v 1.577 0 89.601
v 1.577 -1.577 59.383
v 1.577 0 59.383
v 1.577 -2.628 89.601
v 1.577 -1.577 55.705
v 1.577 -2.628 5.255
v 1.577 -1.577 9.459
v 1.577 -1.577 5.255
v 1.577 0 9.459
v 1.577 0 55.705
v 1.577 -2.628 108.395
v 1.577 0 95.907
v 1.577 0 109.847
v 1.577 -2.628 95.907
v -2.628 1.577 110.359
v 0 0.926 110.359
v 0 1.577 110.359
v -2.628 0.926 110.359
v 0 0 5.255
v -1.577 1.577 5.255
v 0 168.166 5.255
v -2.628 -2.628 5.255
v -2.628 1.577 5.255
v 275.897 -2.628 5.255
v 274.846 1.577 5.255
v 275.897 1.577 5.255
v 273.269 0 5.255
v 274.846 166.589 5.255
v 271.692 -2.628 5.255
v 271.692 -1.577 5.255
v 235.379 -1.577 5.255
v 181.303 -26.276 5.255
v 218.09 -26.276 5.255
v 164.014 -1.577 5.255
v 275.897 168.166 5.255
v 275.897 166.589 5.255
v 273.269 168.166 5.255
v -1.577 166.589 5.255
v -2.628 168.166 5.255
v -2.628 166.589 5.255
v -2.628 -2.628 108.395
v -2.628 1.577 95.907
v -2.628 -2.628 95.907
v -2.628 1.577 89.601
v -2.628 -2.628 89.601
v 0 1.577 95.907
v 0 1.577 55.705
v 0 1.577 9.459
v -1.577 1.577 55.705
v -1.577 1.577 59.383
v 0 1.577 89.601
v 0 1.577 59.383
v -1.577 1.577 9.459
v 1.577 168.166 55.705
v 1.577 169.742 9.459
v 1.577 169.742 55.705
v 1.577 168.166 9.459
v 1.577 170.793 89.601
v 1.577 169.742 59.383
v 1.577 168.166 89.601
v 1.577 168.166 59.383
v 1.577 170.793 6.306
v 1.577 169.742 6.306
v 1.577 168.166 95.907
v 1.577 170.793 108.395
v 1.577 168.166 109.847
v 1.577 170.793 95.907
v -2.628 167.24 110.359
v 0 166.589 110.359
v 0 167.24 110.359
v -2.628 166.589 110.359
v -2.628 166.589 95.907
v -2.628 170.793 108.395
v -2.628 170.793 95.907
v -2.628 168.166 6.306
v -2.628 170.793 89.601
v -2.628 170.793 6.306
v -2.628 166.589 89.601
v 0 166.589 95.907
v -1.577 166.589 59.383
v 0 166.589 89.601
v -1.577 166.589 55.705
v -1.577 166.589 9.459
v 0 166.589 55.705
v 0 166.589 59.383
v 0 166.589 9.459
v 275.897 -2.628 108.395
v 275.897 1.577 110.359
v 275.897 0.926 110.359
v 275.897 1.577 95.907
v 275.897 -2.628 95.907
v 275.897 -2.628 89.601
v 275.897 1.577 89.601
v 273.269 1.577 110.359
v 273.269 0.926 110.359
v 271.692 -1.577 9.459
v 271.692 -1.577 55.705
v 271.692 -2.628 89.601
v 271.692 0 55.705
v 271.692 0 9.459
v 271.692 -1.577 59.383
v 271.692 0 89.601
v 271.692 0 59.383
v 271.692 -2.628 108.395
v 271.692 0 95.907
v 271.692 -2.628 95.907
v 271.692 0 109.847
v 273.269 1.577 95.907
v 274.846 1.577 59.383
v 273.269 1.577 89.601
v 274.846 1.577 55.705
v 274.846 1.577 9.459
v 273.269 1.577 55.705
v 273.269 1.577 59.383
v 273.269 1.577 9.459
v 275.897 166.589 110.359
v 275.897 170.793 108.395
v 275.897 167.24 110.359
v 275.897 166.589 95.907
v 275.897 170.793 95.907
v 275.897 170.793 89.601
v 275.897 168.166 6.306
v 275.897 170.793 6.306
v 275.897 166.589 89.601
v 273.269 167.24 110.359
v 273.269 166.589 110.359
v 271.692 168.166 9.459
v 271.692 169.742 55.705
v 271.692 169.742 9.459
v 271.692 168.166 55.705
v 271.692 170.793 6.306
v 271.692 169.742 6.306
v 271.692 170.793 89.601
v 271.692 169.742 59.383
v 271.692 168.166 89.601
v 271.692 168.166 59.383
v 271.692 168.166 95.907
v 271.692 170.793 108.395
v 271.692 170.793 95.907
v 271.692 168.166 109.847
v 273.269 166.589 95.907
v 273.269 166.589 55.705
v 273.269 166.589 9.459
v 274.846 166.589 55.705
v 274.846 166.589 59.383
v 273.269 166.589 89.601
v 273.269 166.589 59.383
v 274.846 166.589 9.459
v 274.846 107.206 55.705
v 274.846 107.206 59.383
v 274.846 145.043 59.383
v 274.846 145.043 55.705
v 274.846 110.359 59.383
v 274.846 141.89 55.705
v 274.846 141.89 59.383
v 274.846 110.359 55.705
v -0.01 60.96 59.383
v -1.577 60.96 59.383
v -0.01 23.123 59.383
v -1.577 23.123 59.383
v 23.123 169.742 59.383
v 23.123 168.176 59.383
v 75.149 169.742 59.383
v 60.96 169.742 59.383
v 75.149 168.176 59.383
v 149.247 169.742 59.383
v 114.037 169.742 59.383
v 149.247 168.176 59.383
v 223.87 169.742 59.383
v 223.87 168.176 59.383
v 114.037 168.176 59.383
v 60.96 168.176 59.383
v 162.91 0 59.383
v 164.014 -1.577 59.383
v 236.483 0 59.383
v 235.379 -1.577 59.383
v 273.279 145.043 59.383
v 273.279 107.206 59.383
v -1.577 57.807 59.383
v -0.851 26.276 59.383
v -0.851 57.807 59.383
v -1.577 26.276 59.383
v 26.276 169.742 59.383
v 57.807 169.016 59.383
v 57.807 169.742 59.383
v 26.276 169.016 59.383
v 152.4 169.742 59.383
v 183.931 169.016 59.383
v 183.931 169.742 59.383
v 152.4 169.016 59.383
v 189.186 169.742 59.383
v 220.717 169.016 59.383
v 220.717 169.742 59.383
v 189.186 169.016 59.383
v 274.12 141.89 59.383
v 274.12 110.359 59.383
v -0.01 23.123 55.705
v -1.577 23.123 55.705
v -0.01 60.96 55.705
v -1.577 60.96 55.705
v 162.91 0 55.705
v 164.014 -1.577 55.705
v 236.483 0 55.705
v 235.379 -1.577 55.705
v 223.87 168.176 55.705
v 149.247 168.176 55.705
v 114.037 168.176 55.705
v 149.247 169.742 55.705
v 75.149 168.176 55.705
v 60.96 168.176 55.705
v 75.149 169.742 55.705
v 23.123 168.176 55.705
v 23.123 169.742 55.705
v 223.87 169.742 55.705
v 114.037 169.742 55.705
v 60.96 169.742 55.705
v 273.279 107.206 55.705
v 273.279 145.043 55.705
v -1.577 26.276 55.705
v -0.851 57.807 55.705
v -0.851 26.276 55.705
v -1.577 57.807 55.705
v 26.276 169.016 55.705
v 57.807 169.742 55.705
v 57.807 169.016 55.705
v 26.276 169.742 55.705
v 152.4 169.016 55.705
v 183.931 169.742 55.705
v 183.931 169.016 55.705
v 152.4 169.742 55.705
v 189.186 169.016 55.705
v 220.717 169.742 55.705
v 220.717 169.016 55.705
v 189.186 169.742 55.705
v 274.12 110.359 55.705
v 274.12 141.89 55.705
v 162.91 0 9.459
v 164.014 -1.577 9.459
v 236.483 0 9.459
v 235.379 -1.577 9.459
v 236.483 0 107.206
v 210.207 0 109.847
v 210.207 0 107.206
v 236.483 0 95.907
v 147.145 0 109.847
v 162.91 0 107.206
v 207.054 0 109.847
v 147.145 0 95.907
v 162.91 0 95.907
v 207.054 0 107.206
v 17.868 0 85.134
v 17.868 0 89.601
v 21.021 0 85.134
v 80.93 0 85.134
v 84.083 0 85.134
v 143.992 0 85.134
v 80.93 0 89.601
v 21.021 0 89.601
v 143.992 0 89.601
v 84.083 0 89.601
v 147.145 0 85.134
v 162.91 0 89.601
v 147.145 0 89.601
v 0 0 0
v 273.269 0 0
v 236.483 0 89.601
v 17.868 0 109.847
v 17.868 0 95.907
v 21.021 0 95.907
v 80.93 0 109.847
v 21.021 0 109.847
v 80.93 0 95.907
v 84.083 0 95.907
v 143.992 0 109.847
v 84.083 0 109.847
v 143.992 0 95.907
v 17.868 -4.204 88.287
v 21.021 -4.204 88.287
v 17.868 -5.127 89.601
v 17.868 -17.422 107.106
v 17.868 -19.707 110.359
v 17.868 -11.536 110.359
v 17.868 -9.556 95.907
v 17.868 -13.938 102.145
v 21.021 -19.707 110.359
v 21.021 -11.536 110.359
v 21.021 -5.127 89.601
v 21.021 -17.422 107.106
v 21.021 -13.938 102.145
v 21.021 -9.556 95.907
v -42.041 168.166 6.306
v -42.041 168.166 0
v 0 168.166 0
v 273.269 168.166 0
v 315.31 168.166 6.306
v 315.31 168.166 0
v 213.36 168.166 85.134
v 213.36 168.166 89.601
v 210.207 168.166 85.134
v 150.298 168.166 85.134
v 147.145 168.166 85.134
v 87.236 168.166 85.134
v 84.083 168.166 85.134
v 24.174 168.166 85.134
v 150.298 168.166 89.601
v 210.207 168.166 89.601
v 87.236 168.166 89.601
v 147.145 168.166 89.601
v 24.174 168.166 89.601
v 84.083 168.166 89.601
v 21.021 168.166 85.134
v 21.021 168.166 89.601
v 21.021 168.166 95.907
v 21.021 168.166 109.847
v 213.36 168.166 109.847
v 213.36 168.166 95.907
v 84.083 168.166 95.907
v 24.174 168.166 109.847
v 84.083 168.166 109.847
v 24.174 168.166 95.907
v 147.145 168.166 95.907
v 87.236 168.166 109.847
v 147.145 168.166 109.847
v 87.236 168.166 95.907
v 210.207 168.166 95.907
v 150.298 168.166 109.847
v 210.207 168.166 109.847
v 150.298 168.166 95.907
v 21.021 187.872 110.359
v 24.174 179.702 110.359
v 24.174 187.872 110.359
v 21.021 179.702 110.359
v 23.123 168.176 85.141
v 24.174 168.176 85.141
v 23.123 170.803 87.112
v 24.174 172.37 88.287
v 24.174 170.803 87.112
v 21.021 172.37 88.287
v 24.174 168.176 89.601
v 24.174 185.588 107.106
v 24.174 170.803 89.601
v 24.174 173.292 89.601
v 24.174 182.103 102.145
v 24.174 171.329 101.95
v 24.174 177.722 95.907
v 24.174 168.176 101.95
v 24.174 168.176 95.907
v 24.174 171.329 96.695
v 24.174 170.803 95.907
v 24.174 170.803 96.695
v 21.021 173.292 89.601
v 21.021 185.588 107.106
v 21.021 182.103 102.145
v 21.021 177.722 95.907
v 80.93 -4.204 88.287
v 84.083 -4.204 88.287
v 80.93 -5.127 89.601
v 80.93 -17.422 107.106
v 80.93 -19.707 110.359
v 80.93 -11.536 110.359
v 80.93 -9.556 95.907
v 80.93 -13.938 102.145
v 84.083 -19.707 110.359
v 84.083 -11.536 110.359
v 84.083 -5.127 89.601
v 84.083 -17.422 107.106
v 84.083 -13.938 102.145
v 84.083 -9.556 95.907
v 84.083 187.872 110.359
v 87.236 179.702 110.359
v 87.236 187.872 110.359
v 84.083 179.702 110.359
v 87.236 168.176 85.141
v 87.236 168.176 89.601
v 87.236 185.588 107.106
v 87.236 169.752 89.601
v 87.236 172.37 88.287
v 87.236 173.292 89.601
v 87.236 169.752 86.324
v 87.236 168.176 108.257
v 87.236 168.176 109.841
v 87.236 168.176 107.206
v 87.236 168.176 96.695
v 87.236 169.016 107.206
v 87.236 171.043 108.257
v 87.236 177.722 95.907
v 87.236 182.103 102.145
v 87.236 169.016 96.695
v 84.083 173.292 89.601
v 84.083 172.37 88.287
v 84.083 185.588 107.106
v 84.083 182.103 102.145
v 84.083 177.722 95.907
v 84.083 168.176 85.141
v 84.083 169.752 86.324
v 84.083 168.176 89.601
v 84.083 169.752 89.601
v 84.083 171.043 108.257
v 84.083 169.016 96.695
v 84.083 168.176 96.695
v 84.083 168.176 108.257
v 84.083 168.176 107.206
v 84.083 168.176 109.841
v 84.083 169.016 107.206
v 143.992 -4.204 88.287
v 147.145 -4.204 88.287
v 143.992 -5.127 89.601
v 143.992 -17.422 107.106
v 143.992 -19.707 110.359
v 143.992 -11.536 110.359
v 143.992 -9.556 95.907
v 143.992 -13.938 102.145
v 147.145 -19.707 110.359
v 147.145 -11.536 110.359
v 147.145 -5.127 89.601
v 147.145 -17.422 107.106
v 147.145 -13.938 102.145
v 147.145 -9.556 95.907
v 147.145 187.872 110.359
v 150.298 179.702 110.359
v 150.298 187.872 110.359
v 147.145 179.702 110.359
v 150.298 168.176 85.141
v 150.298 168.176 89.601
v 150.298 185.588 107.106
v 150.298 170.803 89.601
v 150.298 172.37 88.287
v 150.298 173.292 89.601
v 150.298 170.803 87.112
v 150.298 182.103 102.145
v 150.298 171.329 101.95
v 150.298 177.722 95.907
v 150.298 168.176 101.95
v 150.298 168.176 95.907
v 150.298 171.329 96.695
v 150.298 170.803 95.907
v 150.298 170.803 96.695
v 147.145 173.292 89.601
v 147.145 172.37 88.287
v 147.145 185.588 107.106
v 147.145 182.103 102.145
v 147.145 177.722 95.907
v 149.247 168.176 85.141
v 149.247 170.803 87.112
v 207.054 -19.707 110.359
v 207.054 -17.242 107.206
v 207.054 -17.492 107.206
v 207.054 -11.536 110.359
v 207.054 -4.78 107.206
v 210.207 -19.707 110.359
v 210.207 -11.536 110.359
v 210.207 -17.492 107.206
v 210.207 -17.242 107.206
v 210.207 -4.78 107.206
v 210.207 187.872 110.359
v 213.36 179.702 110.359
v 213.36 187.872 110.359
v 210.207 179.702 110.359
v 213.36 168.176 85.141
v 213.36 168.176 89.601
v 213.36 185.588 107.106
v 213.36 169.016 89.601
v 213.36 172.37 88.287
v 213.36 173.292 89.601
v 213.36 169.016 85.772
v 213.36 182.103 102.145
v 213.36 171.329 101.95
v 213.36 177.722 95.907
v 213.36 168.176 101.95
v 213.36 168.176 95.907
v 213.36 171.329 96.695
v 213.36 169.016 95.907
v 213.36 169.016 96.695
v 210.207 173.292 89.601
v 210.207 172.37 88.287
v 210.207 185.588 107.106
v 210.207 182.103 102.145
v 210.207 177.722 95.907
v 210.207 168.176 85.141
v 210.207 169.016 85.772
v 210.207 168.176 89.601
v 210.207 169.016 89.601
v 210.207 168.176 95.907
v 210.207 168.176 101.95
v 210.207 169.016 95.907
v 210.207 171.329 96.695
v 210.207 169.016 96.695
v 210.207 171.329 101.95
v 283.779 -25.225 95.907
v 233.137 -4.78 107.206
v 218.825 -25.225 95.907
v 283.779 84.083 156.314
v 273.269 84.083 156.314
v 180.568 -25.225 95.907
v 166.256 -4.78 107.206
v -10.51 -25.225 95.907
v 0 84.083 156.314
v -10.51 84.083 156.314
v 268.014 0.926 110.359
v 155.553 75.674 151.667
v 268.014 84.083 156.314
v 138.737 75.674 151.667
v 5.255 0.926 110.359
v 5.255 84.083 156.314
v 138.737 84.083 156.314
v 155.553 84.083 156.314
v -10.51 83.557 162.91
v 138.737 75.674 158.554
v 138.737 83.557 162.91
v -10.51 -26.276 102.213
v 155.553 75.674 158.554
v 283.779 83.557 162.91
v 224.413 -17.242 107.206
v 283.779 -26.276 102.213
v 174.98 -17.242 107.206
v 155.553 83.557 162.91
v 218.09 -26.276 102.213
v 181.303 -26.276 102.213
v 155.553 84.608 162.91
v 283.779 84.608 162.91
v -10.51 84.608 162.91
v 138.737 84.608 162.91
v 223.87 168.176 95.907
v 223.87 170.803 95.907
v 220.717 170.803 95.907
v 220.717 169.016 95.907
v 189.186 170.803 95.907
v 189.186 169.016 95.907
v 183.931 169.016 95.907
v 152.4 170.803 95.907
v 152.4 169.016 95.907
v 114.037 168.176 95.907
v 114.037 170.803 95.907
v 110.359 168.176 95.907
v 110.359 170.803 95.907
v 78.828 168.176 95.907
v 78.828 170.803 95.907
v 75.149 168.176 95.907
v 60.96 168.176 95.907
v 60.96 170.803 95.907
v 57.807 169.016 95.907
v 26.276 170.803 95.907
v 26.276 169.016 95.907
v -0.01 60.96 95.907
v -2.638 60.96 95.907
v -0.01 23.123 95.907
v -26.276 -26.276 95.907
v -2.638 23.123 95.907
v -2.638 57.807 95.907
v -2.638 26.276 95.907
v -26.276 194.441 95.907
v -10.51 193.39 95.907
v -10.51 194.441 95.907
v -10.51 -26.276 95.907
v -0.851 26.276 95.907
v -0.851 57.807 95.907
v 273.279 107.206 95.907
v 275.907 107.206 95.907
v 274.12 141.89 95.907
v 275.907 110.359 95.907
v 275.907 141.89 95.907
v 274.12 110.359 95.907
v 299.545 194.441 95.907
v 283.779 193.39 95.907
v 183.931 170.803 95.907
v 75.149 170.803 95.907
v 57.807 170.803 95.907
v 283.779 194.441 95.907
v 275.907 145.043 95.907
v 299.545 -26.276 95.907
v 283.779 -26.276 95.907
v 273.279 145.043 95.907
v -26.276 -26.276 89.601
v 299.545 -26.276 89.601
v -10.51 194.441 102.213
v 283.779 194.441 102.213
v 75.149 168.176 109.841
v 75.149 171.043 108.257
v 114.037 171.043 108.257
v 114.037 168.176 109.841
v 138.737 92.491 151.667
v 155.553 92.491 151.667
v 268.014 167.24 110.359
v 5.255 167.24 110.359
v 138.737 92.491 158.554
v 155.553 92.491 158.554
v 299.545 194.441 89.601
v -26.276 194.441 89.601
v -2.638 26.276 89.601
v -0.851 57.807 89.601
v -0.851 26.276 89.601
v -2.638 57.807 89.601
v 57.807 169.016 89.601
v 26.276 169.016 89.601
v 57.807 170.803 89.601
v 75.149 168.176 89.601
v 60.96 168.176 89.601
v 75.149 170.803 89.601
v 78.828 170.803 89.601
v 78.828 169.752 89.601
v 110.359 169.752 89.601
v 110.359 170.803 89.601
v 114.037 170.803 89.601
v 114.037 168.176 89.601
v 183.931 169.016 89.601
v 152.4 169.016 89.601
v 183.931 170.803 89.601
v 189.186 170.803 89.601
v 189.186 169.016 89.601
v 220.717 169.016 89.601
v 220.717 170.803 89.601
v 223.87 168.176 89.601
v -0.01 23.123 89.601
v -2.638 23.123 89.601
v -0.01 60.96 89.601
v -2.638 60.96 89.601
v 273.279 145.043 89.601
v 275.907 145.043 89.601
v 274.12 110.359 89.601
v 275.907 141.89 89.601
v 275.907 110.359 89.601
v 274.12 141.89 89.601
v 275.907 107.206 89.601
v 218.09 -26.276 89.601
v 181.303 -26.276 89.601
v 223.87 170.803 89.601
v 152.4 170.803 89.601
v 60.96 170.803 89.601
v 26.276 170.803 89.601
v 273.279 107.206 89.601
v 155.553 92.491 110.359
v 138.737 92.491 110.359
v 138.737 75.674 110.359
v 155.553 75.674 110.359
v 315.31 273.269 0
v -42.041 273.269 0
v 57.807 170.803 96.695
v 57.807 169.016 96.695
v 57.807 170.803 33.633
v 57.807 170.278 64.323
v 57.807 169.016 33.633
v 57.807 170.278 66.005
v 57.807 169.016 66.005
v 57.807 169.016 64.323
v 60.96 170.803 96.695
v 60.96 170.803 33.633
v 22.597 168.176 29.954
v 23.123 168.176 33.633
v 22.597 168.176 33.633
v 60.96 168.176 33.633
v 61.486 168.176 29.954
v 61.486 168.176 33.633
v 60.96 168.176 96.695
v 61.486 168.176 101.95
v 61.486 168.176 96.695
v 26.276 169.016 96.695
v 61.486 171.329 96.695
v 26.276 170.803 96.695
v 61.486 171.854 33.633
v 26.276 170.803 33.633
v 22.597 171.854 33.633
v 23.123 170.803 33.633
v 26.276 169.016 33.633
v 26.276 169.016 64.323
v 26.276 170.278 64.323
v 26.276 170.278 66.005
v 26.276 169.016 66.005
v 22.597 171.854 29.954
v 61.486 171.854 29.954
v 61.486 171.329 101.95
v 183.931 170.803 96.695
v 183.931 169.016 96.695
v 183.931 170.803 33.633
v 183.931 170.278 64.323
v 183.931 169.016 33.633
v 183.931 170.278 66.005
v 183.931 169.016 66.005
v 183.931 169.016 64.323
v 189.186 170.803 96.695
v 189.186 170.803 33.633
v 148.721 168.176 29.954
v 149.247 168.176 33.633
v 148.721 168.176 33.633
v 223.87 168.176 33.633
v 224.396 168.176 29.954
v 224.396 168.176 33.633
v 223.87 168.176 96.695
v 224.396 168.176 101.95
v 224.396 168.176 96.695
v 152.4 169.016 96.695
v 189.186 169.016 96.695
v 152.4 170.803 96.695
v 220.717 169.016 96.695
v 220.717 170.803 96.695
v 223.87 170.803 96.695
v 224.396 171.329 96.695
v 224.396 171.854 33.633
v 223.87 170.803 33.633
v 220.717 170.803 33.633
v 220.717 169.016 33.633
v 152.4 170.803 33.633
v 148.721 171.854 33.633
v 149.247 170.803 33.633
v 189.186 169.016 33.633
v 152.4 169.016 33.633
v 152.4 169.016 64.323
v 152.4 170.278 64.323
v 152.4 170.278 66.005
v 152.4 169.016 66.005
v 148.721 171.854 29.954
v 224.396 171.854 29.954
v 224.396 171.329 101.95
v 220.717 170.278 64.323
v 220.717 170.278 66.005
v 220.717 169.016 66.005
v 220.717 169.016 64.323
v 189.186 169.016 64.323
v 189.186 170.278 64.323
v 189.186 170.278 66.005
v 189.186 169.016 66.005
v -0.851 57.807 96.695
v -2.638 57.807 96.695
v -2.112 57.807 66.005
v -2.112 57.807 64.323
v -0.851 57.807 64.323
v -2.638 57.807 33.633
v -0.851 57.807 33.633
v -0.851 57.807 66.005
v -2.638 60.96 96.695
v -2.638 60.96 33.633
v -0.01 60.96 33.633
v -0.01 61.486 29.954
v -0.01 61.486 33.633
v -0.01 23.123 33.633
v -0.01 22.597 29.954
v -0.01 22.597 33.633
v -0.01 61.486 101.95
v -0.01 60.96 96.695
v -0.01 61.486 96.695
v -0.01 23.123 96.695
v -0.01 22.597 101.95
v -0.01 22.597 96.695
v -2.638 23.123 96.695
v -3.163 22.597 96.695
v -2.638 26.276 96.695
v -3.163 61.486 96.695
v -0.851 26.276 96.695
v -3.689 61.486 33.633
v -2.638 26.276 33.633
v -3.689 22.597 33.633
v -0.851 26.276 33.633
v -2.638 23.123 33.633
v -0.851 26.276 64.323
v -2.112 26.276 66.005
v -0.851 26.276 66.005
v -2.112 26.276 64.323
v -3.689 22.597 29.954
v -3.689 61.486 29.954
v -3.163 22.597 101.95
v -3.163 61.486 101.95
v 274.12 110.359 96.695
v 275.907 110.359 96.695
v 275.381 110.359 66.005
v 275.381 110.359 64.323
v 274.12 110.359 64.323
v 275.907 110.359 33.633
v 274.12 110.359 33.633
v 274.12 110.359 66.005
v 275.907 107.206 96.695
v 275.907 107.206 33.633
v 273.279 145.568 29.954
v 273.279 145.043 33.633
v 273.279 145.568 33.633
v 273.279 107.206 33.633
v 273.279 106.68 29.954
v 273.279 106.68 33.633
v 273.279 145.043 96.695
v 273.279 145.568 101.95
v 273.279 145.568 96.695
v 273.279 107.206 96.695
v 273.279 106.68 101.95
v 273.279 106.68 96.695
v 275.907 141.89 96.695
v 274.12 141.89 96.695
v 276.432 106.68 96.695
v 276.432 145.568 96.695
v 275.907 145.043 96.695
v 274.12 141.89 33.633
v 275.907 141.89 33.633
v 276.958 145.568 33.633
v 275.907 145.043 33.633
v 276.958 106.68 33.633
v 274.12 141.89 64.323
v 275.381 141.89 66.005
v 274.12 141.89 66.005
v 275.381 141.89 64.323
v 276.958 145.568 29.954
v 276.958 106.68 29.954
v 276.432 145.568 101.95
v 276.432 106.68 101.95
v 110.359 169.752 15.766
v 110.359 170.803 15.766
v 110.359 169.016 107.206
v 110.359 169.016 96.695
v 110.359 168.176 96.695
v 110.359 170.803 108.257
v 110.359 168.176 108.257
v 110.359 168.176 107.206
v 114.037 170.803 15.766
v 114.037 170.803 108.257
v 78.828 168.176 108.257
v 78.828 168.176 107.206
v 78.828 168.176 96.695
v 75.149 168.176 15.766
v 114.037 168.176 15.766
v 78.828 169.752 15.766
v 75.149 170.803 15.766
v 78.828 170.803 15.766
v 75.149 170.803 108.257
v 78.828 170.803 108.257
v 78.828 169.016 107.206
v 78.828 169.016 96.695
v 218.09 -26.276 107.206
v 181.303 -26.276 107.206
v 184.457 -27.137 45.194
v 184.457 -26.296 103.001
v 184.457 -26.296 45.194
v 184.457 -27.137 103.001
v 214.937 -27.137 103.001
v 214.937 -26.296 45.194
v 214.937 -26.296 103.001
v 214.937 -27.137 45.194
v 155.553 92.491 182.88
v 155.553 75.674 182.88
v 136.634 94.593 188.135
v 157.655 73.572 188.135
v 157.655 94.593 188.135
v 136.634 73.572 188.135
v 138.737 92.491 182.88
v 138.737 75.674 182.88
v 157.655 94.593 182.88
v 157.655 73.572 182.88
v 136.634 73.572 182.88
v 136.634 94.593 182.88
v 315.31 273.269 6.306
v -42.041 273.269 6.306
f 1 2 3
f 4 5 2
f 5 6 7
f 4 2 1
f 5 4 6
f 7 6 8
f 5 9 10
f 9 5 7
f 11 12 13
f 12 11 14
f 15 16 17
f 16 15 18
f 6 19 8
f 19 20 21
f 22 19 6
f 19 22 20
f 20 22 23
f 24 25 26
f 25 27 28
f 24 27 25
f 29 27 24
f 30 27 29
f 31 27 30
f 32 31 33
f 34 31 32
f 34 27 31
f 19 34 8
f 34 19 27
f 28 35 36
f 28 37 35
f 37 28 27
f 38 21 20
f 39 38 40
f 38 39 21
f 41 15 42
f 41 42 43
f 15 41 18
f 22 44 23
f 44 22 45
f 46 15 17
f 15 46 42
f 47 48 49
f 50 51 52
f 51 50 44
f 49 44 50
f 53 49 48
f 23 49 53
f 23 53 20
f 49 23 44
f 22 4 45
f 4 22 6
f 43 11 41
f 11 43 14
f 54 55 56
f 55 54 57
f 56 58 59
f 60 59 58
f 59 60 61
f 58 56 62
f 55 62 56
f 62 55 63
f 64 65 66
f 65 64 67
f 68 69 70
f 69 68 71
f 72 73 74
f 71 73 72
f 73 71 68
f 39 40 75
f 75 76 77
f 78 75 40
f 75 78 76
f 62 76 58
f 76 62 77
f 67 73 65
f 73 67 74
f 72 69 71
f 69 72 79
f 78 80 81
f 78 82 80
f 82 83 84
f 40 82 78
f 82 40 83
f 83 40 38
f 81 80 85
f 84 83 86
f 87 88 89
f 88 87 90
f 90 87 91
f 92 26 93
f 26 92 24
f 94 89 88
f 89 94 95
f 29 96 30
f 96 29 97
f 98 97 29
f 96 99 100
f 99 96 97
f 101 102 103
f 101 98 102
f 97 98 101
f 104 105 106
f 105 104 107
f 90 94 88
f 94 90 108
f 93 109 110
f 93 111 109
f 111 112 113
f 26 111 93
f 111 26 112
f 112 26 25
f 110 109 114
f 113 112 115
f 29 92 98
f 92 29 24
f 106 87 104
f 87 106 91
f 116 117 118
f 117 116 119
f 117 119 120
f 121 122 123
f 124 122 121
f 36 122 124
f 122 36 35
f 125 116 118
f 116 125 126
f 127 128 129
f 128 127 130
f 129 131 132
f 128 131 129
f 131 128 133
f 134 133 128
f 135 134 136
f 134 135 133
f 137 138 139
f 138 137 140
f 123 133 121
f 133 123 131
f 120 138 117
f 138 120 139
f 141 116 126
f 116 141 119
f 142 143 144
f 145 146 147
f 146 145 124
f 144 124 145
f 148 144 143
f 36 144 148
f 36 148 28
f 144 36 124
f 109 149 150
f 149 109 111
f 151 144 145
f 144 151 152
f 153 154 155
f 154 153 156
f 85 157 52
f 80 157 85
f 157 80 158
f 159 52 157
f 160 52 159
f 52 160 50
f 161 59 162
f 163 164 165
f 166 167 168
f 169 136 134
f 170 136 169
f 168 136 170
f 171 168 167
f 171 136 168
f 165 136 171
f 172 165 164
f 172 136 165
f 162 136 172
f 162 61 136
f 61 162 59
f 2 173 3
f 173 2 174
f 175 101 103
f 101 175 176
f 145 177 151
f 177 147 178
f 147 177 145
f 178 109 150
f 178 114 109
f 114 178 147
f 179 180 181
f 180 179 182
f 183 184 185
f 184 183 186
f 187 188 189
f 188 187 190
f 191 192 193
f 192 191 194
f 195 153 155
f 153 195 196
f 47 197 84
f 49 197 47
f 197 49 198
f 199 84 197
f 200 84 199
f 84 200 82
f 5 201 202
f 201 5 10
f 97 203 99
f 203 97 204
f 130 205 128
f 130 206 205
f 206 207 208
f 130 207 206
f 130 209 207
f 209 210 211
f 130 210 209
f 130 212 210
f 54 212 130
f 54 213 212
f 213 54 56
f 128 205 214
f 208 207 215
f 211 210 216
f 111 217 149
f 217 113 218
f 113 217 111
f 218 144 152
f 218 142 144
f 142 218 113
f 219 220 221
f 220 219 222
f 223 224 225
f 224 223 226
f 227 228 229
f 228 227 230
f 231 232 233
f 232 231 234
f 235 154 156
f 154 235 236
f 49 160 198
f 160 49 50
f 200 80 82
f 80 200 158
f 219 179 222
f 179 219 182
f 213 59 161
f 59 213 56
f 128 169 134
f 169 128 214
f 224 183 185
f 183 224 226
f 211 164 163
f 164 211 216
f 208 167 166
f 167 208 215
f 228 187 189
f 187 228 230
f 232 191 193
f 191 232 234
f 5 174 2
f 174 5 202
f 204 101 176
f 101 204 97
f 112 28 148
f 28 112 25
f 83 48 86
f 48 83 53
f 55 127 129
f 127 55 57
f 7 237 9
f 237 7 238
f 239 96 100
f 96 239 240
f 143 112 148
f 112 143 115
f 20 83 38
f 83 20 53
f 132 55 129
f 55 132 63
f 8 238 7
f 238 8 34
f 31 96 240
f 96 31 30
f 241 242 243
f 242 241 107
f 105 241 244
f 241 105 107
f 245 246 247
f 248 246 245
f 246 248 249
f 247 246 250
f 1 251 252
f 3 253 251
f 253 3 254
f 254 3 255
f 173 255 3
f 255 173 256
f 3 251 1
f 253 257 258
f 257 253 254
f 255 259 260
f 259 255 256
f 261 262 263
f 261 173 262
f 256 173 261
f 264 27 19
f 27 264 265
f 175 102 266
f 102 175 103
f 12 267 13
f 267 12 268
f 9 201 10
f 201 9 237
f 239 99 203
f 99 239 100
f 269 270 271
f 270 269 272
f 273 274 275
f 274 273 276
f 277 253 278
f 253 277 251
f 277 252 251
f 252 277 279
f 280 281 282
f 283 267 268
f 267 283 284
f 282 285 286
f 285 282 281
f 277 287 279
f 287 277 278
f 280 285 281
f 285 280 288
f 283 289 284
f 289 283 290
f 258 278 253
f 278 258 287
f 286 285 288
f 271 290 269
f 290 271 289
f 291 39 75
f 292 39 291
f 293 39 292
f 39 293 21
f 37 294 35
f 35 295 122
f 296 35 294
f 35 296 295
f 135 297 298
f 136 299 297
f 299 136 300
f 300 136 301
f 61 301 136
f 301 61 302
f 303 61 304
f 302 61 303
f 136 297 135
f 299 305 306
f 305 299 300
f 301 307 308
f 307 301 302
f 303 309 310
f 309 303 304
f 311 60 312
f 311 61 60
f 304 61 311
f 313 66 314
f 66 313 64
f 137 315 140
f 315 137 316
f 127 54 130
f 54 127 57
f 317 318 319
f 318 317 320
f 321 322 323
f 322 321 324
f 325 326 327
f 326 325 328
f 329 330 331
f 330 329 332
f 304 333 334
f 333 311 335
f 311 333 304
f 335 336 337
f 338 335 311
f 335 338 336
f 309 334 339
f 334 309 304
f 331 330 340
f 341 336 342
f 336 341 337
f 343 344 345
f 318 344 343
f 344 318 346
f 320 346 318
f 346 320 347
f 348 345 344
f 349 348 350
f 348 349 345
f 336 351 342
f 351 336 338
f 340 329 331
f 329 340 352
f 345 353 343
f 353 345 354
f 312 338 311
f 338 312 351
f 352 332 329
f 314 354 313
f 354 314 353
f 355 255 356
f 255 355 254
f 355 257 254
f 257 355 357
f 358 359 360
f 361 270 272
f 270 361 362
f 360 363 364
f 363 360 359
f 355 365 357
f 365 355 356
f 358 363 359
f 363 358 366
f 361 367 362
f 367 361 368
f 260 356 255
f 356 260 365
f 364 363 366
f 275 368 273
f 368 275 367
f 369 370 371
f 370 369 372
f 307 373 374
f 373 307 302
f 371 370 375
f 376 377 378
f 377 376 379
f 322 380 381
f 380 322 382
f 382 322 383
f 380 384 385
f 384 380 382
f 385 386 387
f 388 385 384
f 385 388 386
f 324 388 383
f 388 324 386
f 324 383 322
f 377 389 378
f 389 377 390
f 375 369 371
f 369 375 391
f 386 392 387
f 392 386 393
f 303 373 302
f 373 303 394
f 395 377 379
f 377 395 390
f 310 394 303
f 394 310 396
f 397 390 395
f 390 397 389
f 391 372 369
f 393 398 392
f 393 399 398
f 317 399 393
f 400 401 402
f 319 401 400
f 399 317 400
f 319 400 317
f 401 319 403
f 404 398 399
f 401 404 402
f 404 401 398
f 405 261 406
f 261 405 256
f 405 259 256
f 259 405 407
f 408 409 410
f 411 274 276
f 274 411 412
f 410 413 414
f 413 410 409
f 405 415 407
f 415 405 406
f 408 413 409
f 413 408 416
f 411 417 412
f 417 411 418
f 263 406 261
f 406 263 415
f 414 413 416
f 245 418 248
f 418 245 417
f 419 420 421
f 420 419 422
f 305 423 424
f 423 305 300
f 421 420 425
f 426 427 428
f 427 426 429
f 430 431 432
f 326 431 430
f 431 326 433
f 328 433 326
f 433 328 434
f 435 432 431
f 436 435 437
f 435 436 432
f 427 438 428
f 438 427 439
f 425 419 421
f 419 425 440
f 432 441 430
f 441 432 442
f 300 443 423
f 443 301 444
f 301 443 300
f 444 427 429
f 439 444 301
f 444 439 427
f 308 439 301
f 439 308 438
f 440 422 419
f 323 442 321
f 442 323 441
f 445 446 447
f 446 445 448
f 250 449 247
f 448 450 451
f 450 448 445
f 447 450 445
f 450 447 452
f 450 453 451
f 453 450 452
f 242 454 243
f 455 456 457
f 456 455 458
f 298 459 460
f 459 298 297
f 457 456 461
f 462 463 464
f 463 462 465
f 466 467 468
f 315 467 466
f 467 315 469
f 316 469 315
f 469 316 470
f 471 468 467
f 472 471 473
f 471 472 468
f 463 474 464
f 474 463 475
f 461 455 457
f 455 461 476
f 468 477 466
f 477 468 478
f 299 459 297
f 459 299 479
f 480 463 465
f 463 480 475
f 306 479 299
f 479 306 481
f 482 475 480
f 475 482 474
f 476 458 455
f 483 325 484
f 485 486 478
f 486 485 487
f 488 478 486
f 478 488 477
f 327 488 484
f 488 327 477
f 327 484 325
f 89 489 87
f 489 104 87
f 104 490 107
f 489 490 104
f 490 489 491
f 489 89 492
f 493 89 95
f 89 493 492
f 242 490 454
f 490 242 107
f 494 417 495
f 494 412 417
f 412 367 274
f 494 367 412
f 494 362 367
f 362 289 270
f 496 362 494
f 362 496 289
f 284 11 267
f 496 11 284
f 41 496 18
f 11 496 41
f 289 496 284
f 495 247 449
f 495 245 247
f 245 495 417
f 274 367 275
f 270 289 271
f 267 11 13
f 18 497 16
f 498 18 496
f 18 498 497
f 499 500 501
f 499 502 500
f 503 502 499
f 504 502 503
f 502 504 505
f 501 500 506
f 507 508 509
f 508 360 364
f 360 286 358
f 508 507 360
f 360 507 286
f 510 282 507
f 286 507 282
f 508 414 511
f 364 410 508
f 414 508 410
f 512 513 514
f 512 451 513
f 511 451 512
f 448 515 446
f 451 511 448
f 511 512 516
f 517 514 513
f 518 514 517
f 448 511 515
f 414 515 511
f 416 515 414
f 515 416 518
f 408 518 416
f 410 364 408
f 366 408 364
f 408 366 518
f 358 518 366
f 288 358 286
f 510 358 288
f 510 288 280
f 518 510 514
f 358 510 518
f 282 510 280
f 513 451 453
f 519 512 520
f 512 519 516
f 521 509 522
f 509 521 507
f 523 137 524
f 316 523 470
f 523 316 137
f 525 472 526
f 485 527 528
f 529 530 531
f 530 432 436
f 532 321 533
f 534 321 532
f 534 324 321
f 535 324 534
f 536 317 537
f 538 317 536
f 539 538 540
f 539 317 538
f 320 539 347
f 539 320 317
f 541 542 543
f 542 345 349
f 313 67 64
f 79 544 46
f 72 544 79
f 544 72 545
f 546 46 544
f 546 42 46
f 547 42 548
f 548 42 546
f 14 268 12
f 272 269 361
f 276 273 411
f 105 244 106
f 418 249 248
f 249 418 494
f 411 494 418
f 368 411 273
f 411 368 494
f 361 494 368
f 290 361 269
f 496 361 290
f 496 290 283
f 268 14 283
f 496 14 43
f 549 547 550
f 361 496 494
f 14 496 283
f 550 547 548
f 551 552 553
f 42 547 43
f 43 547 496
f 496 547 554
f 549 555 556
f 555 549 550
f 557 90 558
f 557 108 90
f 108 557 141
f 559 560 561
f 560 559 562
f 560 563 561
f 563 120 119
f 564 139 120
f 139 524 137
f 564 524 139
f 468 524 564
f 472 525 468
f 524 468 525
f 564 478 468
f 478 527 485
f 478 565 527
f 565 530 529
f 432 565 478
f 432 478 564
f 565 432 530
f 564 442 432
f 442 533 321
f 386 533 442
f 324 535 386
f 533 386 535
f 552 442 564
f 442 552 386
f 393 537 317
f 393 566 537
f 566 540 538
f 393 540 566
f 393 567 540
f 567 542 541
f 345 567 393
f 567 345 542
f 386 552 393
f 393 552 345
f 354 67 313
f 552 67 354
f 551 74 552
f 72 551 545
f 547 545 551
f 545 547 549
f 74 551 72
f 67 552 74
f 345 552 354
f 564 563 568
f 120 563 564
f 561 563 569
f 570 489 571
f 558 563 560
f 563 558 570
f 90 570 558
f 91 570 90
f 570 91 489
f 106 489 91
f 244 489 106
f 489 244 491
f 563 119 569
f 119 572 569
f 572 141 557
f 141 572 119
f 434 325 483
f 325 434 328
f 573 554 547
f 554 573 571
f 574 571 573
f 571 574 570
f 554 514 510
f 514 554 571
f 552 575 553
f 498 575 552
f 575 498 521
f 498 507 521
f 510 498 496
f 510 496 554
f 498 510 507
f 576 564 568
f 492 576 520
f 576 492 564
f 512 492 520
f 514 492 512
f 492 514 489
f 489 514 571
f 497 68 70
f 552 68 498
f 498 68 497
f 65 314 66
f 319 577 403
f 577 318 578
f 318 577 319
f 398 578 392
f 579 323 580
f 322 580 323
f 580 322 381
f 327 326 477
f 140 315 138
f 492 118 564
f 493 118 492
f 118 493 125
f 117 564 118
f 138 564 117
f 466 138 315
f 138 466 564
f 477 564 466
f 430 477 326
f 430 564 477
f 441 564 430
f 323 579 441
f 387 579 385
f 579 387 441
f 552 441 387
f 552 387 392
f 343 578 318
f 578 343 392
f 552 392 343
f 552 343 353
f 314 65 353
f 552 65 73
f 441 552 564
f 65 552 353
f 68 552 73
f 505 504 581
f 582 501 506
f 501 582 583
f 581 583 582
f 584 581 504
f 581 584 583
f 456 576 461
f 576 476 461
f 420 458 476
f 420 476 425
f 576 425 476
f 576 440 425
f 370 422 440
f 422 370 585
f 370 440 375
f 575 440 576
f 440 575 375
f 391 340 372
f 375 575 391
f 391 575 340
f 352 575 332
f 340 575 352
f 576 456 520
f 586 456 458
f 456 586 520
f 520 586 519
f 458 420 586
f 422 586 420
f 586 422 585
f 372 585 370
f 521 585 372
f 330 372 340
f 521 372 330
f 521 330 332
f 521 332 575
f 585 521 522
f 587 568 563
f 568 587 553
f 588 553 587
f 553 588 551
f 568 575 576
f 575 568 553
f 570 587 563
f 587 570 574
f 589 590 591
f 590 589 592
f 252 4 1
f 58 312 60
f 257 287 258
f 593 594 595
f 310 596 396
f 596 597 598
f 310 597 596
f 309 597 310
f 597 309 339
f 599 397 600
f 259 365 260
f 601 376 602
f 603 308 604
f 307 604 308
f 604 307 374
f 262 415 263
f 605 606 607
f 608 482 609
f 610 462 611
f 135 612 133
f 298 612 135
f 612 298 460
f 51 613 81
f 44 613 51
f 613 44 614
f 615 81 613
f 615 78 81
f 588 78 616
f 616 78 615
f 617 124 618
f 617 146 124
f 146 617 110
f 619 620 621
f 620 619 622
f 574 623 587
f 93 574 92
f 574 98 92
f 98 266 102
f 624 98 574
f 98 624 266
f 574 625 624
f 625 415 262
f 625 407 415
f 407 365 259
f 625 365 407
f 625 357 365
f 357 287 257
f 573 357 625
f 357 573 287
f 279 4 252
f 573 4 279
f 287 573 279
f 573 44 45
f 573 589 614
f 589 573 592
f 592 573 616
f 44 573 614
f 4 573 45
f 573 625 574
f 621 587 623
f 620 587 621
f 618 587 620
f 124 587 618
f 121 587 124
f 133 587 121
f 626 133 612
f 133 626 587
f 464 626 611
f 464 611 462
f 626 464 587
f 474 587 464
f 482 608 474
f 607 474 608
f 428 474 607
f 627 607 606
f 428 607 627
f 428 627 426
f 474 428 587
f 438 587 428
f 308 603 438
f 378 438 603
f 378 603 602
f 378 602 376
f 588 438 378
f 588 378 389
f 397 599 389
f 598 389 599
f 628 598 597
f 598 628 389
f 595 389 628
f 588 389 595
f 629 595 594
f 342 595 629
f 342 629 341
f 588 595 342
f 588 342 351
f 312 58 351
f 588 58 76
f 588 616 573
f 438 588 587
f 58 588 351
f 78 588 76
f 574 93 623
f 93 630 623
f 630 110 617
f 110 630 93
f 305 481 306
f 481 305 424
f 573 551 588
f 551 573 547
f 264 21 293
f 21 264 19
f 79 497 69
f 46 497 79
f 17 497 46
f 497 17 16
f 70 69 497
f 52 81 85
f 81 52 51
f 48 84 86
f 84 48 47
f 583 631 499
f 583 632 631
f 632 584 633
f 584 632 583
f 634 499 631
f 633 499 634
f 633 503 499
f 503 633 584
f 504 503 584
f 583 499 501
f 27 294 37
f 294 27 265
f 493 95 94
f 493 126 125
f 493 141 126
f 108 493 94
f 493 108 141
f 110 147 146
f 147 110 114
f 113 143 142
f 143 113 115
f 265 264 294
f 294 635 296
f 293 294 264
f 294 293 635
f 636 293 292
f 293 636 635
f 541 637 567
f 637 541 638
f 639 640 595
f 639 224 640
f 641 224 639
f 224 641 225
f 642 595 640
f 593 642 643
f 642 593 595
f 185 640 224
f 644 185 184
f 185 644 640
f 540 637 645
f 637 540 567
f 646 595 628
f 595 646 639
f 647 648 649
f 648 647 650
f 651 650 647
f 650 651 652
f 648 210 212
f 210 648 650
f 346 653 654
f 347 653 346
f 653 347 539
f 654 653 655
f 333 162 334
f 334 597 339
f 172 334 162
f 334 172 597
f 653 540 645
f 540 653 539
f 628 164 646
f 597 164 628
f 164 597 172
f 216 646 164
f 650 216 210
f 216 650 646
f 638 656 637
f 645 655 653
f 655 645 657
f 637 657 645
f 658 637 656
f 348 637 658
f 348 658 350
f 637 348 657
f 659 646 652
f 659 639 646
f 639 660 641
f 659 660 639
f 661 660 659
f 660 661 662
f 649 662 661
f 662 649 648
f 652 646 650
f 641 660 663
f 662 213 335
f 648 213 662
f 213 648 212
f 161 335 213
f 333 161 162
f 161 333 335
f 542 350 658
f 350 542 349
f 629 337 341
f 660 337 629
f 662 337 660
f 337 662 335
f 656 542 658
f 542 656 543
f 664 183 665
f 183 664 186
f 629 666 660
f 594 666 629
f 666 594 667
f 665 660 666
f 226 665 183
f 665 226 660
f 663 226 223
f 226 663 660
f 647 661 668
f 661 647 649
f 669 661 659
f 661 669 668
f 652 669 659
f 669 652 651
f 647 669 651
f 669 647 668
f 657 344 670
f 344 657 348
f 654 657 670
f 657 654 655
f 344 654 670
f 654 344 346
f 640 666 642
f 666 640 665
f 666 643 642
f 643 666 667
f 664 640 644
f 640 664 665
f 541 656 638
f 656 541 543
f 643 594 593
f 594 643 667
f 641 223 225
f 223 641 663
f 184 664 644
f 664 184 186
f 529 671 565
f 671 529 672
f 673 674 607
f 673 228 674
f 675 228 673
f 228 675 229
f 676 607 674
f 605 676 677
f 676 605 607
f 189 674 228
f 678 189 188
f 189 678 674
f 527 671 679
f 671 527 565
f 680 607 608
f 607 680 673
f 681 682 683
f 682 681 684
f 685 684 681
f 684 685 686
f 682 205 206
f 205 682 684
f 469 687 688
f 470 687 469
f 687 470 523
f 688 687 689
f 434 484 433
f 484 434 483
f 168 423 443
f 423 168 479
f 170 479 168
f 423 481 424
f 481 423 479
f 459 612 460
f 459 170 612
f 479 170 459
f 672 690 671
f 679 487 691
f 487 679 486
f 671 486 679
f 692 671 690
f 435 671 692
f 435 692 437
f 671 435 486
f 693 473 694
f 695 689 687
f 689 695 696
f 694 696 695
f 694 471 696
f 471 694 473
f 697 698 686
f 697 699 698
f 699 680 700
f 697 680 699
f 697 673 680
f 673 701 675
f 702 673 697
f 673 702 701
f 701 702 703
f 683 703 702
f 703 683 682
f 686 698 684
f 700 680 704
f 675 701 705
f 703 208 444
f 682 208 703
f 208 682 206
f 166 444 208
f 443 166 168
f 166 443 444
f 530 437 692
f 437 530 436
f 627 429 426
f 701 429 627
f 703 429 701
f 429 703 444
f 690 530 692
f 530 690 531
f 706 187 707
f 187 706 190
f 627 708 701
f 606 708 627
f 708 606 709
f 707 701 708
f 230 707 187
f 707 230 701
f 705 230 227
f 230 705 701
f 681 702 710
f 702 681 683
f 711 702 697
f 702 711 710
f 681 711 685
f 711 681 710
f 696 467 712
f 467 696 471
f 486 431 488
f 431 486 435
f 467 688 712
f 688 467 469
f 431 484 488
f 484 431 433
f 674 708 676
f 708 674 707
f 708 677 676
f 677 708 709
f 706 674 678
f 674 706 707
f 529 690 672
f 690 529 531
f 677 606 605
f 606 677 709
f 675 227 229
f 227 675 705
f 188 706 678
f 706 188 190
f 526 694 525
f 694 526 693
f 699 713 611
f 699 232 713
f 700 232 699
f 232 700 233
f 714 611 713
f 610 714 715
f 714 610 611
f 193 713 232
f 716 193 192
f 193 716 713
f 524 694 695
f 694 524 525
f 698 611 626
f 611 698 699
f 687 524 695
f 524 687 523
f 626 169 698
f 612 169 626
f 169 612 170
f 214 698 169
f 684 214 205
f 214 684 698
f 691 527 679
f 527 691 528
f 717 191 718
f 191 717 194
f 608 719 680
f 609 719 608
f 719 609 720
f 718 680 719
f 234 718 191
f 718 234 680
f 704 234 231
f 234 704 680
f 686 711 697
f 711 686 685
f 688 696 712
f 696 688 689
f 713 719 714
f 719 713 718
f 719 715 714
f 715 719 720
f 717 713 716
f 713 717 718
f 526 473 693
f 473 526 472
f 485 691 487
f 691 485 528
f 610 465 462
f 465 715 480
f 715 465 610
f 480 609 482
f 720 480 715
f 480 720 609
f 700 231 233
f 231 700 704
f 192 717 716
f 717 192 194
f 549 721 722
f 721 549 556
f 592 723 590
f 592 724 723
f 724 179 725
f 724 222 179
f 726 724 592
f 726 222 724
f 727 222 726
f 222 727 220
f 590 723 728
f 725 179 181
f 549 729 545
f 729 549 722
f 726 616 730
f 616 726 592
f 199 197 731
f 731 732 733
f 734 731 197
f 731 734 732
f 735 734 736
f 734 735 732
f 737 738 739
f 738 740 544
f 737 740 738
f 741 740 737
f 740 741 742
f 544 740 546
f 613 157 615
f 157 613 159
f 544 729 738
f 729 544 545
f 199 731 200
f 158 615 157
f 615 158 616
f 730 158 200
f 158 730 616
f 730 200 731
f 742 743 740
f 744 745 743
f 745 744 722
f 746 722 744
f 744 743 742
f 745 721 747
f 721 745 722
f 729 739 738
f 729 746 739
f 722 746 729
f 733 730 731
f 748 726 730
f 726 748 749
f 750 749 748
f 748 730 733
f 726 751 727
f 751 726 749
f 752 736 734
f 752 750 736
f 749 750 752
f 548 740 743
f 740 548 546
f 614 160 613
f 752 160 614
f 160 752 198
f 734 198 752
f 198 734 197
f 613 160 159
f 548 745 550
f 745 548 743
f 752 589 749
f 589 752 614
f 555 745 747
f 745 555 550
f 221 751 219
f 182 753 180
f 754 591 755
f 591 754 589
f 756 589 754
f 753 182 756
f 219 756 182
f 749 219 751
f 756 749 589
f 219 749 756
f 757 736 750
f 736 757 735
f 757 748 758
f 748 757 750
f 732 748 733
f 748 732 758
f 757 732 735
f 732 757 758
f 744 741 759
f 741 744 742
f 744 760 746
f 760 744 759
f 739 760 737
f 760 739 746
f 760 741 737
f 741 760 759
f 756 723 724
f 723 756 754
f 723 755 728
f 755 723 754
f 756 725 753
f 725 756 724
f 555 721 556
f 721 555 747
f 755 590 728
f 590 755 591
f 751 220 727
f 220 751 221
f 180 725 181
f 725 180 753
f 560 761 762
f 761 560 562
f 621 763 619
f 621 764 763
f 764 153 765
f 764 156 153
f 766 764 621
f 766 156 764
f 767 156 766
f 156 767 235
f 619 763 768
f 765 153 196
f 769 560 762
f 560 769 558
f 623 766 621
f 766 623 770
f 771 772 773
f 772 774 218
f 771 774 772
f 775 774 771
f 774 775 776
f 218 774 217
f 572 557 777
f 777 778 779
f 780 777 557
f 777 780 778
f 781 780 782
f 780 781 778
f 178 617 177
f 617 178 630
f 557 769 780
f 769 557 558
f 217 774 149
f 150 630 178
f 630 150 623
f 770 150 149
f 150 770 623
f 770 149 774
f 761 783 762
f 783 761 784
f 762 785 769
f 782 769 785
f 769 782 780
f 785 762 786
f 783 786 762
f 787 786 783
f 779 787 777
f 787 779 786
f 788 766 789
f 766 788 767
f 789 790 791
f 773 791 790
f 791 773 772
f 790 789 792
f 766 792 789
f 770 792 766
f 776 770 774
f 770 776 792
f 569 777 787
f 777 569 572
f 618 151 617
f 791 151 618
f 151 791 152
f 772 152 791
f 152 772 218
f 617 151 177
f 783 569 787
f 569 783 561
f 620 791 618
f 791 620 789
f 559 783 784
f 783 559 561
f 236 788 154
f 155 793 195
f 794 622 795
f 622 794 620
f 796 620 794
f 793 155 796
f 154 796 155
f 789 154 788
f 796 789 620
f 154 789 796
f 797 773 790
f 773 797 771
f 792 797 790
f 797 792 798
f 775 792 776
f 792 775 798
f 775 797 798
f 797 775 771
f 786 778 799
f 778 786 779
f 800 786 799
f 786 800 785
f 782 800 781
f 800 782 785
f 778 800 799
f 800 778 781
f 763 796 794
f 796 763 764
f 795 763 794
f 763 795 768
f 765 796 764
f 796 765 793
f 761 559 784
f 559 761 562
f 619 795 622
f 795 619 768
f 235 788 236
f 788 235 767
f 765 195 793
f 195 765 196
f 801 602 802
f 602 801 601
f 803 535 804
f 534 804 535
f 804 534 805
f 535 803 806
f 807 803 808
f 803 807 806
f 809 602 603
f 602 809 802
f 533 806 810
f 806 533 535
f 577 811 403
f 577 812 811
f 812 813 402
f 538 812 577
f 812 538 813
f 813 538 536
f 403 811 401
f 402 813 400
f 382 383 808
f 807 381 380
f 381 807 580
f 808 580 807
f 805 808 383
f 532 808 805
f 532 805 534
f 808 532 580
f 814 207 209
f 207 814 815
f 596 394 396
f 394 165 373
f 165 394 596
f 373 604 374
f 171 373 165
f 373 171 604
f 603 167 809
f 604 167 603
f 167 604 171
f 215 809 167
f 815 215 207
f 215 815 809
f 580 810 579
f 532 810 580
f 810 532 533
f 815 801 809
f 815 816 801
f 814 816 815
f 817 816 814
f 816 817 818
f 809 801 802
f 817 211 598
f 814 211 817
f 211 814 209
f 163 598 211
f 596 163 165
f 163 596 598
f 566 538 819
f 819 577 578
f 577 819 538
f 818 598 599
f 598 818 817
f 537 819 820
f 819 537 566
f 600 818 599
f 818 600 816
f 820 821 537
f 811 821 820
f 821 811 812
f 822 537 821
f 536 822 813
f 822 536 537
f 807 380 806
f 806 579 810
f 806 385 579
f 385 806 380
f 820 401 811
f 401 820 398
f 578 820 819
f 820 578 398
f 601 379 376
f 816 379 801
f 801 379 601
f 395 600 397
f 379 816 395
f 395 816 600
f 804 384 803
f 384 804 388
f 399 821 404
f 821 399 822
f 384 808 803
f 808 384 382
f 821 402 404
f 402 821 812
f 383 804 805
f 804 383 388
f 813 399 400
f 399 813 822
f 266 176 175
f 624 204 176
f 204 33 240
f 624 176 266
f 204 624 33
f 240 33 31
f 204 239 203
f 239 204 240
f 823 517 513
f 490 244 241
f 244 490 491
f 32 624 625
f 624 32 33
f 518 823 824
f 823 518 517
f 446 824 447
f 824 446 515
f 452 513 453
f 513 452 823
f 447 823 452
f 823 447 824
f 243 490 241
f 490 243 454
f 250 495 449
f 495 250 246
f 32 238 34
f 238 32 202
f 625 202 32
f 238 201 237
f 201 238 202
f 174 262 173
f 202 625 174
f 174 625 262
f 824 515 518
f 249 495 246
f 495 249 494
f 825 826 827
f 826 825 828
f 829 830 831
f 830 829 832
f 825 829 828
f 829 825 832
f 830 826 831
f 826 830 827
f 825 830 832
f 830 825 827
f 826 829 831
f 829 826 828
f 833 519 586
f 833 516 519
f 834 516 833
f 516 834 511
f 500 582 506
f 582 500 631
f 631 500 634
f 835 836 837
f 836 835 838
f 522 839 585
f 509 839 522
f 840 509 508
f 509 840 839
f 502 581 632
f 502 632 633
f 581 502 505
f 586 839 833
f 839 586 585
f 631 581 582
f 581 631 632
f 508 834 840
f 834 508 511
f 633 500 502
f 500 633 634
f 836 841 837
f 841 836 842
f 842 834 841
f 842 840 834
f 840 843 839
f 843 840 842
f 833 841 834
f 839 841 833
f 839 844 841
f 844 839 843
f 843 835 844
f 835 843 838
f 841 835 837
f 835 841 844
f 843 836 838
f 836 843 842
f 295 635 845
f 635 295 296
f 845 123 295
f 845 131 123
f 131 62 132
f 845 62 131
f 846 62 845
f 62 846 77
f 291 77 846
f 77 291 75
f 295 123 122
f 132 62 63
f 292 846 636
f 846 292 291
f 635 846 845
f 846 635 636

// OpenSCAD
// =====================================================================
//  MILWAUKEE ROAD - STANDARD 16 X 26 FT DEPOT, EAST MOLINE (C.M.&ST.P., NOV 1898)
//  Album of Depot Plans (1919), sheet 02. Private reference (in copyright):
//  Research Library / RSW / Stations / Standard depots / Album of Depot Plans 1919.
//  Rib Side Works, 24 Nov 2026. FIRST SHAPE MODEL for review - not cut into print sections.
//  KNOWN (from the sheet): 16 x 26 ft; waiting room 14, office 11 with bay; shingle roof with cresting, drop siding.
//  ESTIMATE: wall and ridge heights (sheets are small copies), window spacing, colours.
//  Shared depot builder ../../../_common/rsw_depot.scad (x along the track, y = 0 town side,
//  track side +y, feet).  SCALE: 29 = G, 48 = O, 87 = HO.
// =====================================================================
SCALE = 29;
include <../../../_common/rsw_depot.scad>

depot(blocks = [[0, 26, 0, 16, 10.5, 0.55, 1, 2.5, 0]],
      pavs   = [],
      wins   = [[4, 1, 3, 6, 3.2], [16, 1, 3, 6, 3.2], [19.5, 1, 3, 6, 3.2], [4, 2, 3, 6, 3.2], [12, 3, 3, 6, 3.2]],
      doors  = [[9, 1, 3, 7.5, 0]],
      bays   = [[19, 0, 7, 2.5]],
      chims  = [[14, 8, 17.9]],
      plat   = [-4, 34, 10, 0.6]);
